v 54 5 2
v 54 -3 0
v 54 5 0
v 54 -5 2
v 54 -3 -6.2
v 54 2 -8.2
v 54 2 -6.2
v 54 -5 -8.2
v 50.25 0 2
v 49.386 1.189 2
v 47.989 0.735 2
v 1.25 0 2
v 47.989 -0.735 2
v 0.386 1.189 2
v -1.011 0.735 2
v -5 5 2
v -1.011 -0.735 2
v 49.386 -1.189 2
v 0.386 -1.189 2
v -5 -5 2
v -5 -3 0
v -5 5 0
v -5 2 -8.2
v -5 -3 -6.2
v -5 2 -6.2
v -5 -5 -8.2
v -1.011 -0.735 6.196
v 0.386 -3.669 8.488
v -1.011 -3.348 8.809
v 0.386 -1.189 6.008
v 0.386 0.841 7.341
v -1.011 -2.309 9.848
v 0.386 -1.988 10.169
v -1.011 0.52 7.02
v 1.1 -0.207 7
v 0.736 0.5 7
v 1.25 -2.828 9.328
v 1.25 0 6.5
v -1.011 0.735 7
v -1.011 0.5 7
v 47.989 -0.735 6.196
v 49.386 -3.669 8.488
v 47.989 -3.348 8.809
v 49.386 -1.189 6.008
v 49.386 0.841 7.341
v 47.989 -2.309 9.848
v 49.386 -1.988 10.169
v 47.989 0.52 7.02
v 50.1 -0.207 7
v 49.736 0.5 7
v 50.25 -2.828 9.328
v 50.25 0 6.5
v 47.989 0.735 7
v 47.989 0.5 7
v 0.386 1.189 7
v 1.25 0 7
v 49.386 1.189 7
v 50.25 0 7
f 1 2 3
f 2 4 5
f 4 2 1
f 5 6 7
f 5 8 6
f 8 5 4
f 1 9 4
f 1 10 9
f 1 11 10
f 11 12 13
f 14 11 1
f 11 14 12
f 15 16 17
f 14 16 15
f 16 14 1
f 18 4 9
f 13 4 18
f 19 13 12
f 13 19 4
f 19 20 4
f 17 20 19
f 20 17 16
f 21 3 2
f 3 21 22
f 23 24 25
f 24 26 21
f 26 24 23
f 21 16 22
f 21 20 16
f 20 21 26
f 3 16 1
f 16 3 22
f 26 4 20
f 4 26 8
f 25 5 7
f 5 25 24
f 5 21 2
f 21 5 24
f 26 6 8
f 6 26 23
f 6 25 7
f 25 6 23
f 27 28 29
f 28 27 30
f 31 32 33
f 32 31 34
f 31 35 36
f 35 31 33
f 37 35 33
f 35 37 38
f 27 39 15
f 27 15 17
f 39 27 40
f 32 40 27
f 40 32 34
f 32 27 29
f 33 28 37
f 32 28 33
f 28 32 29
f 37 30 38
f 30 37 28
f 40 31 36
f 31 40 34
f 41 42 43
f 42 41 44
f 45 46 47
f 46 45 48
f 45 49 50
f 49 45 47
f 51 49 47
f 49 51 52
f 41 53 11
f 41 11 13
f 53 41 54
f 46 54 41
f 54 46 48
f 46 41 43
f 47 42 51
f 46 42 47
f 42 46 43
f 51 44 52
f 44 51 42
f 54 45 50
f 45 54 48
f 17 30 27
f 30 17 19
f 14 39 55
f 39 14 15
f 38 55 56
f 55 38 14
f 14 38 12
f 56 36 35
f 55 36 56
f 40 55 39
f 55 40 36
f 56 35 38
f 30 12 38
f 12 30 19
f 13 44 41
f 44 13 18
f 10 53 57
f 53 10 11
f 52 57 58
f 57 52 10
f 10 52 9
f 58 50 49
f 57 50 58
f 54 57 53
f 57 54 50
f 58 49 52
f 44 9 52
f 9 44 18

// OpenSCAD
thickness = 2;
wall_thickness = 6.2;

translate([-5,-5,0]){
    cube([49+10,10,thickness]);
    translate([0,0,-wall_thickness]) cube([49+10,thickness,wall_thickness]);
    translate([0,0,-wall_thickness-thickness]) cube([49+10,5+thickness,thickness]);
    }
    
    
cylinder(h=7, d=2.5);
translate([49,0,0]) cylinder(h=7, d=2.5);
    
    
translate([0,0,6.5])
rotate([45,0,0])
{
    cylinder(h=4, d=2.5);
translate([49,0,0]) cylinder(h=4, d=2.5);
    }
